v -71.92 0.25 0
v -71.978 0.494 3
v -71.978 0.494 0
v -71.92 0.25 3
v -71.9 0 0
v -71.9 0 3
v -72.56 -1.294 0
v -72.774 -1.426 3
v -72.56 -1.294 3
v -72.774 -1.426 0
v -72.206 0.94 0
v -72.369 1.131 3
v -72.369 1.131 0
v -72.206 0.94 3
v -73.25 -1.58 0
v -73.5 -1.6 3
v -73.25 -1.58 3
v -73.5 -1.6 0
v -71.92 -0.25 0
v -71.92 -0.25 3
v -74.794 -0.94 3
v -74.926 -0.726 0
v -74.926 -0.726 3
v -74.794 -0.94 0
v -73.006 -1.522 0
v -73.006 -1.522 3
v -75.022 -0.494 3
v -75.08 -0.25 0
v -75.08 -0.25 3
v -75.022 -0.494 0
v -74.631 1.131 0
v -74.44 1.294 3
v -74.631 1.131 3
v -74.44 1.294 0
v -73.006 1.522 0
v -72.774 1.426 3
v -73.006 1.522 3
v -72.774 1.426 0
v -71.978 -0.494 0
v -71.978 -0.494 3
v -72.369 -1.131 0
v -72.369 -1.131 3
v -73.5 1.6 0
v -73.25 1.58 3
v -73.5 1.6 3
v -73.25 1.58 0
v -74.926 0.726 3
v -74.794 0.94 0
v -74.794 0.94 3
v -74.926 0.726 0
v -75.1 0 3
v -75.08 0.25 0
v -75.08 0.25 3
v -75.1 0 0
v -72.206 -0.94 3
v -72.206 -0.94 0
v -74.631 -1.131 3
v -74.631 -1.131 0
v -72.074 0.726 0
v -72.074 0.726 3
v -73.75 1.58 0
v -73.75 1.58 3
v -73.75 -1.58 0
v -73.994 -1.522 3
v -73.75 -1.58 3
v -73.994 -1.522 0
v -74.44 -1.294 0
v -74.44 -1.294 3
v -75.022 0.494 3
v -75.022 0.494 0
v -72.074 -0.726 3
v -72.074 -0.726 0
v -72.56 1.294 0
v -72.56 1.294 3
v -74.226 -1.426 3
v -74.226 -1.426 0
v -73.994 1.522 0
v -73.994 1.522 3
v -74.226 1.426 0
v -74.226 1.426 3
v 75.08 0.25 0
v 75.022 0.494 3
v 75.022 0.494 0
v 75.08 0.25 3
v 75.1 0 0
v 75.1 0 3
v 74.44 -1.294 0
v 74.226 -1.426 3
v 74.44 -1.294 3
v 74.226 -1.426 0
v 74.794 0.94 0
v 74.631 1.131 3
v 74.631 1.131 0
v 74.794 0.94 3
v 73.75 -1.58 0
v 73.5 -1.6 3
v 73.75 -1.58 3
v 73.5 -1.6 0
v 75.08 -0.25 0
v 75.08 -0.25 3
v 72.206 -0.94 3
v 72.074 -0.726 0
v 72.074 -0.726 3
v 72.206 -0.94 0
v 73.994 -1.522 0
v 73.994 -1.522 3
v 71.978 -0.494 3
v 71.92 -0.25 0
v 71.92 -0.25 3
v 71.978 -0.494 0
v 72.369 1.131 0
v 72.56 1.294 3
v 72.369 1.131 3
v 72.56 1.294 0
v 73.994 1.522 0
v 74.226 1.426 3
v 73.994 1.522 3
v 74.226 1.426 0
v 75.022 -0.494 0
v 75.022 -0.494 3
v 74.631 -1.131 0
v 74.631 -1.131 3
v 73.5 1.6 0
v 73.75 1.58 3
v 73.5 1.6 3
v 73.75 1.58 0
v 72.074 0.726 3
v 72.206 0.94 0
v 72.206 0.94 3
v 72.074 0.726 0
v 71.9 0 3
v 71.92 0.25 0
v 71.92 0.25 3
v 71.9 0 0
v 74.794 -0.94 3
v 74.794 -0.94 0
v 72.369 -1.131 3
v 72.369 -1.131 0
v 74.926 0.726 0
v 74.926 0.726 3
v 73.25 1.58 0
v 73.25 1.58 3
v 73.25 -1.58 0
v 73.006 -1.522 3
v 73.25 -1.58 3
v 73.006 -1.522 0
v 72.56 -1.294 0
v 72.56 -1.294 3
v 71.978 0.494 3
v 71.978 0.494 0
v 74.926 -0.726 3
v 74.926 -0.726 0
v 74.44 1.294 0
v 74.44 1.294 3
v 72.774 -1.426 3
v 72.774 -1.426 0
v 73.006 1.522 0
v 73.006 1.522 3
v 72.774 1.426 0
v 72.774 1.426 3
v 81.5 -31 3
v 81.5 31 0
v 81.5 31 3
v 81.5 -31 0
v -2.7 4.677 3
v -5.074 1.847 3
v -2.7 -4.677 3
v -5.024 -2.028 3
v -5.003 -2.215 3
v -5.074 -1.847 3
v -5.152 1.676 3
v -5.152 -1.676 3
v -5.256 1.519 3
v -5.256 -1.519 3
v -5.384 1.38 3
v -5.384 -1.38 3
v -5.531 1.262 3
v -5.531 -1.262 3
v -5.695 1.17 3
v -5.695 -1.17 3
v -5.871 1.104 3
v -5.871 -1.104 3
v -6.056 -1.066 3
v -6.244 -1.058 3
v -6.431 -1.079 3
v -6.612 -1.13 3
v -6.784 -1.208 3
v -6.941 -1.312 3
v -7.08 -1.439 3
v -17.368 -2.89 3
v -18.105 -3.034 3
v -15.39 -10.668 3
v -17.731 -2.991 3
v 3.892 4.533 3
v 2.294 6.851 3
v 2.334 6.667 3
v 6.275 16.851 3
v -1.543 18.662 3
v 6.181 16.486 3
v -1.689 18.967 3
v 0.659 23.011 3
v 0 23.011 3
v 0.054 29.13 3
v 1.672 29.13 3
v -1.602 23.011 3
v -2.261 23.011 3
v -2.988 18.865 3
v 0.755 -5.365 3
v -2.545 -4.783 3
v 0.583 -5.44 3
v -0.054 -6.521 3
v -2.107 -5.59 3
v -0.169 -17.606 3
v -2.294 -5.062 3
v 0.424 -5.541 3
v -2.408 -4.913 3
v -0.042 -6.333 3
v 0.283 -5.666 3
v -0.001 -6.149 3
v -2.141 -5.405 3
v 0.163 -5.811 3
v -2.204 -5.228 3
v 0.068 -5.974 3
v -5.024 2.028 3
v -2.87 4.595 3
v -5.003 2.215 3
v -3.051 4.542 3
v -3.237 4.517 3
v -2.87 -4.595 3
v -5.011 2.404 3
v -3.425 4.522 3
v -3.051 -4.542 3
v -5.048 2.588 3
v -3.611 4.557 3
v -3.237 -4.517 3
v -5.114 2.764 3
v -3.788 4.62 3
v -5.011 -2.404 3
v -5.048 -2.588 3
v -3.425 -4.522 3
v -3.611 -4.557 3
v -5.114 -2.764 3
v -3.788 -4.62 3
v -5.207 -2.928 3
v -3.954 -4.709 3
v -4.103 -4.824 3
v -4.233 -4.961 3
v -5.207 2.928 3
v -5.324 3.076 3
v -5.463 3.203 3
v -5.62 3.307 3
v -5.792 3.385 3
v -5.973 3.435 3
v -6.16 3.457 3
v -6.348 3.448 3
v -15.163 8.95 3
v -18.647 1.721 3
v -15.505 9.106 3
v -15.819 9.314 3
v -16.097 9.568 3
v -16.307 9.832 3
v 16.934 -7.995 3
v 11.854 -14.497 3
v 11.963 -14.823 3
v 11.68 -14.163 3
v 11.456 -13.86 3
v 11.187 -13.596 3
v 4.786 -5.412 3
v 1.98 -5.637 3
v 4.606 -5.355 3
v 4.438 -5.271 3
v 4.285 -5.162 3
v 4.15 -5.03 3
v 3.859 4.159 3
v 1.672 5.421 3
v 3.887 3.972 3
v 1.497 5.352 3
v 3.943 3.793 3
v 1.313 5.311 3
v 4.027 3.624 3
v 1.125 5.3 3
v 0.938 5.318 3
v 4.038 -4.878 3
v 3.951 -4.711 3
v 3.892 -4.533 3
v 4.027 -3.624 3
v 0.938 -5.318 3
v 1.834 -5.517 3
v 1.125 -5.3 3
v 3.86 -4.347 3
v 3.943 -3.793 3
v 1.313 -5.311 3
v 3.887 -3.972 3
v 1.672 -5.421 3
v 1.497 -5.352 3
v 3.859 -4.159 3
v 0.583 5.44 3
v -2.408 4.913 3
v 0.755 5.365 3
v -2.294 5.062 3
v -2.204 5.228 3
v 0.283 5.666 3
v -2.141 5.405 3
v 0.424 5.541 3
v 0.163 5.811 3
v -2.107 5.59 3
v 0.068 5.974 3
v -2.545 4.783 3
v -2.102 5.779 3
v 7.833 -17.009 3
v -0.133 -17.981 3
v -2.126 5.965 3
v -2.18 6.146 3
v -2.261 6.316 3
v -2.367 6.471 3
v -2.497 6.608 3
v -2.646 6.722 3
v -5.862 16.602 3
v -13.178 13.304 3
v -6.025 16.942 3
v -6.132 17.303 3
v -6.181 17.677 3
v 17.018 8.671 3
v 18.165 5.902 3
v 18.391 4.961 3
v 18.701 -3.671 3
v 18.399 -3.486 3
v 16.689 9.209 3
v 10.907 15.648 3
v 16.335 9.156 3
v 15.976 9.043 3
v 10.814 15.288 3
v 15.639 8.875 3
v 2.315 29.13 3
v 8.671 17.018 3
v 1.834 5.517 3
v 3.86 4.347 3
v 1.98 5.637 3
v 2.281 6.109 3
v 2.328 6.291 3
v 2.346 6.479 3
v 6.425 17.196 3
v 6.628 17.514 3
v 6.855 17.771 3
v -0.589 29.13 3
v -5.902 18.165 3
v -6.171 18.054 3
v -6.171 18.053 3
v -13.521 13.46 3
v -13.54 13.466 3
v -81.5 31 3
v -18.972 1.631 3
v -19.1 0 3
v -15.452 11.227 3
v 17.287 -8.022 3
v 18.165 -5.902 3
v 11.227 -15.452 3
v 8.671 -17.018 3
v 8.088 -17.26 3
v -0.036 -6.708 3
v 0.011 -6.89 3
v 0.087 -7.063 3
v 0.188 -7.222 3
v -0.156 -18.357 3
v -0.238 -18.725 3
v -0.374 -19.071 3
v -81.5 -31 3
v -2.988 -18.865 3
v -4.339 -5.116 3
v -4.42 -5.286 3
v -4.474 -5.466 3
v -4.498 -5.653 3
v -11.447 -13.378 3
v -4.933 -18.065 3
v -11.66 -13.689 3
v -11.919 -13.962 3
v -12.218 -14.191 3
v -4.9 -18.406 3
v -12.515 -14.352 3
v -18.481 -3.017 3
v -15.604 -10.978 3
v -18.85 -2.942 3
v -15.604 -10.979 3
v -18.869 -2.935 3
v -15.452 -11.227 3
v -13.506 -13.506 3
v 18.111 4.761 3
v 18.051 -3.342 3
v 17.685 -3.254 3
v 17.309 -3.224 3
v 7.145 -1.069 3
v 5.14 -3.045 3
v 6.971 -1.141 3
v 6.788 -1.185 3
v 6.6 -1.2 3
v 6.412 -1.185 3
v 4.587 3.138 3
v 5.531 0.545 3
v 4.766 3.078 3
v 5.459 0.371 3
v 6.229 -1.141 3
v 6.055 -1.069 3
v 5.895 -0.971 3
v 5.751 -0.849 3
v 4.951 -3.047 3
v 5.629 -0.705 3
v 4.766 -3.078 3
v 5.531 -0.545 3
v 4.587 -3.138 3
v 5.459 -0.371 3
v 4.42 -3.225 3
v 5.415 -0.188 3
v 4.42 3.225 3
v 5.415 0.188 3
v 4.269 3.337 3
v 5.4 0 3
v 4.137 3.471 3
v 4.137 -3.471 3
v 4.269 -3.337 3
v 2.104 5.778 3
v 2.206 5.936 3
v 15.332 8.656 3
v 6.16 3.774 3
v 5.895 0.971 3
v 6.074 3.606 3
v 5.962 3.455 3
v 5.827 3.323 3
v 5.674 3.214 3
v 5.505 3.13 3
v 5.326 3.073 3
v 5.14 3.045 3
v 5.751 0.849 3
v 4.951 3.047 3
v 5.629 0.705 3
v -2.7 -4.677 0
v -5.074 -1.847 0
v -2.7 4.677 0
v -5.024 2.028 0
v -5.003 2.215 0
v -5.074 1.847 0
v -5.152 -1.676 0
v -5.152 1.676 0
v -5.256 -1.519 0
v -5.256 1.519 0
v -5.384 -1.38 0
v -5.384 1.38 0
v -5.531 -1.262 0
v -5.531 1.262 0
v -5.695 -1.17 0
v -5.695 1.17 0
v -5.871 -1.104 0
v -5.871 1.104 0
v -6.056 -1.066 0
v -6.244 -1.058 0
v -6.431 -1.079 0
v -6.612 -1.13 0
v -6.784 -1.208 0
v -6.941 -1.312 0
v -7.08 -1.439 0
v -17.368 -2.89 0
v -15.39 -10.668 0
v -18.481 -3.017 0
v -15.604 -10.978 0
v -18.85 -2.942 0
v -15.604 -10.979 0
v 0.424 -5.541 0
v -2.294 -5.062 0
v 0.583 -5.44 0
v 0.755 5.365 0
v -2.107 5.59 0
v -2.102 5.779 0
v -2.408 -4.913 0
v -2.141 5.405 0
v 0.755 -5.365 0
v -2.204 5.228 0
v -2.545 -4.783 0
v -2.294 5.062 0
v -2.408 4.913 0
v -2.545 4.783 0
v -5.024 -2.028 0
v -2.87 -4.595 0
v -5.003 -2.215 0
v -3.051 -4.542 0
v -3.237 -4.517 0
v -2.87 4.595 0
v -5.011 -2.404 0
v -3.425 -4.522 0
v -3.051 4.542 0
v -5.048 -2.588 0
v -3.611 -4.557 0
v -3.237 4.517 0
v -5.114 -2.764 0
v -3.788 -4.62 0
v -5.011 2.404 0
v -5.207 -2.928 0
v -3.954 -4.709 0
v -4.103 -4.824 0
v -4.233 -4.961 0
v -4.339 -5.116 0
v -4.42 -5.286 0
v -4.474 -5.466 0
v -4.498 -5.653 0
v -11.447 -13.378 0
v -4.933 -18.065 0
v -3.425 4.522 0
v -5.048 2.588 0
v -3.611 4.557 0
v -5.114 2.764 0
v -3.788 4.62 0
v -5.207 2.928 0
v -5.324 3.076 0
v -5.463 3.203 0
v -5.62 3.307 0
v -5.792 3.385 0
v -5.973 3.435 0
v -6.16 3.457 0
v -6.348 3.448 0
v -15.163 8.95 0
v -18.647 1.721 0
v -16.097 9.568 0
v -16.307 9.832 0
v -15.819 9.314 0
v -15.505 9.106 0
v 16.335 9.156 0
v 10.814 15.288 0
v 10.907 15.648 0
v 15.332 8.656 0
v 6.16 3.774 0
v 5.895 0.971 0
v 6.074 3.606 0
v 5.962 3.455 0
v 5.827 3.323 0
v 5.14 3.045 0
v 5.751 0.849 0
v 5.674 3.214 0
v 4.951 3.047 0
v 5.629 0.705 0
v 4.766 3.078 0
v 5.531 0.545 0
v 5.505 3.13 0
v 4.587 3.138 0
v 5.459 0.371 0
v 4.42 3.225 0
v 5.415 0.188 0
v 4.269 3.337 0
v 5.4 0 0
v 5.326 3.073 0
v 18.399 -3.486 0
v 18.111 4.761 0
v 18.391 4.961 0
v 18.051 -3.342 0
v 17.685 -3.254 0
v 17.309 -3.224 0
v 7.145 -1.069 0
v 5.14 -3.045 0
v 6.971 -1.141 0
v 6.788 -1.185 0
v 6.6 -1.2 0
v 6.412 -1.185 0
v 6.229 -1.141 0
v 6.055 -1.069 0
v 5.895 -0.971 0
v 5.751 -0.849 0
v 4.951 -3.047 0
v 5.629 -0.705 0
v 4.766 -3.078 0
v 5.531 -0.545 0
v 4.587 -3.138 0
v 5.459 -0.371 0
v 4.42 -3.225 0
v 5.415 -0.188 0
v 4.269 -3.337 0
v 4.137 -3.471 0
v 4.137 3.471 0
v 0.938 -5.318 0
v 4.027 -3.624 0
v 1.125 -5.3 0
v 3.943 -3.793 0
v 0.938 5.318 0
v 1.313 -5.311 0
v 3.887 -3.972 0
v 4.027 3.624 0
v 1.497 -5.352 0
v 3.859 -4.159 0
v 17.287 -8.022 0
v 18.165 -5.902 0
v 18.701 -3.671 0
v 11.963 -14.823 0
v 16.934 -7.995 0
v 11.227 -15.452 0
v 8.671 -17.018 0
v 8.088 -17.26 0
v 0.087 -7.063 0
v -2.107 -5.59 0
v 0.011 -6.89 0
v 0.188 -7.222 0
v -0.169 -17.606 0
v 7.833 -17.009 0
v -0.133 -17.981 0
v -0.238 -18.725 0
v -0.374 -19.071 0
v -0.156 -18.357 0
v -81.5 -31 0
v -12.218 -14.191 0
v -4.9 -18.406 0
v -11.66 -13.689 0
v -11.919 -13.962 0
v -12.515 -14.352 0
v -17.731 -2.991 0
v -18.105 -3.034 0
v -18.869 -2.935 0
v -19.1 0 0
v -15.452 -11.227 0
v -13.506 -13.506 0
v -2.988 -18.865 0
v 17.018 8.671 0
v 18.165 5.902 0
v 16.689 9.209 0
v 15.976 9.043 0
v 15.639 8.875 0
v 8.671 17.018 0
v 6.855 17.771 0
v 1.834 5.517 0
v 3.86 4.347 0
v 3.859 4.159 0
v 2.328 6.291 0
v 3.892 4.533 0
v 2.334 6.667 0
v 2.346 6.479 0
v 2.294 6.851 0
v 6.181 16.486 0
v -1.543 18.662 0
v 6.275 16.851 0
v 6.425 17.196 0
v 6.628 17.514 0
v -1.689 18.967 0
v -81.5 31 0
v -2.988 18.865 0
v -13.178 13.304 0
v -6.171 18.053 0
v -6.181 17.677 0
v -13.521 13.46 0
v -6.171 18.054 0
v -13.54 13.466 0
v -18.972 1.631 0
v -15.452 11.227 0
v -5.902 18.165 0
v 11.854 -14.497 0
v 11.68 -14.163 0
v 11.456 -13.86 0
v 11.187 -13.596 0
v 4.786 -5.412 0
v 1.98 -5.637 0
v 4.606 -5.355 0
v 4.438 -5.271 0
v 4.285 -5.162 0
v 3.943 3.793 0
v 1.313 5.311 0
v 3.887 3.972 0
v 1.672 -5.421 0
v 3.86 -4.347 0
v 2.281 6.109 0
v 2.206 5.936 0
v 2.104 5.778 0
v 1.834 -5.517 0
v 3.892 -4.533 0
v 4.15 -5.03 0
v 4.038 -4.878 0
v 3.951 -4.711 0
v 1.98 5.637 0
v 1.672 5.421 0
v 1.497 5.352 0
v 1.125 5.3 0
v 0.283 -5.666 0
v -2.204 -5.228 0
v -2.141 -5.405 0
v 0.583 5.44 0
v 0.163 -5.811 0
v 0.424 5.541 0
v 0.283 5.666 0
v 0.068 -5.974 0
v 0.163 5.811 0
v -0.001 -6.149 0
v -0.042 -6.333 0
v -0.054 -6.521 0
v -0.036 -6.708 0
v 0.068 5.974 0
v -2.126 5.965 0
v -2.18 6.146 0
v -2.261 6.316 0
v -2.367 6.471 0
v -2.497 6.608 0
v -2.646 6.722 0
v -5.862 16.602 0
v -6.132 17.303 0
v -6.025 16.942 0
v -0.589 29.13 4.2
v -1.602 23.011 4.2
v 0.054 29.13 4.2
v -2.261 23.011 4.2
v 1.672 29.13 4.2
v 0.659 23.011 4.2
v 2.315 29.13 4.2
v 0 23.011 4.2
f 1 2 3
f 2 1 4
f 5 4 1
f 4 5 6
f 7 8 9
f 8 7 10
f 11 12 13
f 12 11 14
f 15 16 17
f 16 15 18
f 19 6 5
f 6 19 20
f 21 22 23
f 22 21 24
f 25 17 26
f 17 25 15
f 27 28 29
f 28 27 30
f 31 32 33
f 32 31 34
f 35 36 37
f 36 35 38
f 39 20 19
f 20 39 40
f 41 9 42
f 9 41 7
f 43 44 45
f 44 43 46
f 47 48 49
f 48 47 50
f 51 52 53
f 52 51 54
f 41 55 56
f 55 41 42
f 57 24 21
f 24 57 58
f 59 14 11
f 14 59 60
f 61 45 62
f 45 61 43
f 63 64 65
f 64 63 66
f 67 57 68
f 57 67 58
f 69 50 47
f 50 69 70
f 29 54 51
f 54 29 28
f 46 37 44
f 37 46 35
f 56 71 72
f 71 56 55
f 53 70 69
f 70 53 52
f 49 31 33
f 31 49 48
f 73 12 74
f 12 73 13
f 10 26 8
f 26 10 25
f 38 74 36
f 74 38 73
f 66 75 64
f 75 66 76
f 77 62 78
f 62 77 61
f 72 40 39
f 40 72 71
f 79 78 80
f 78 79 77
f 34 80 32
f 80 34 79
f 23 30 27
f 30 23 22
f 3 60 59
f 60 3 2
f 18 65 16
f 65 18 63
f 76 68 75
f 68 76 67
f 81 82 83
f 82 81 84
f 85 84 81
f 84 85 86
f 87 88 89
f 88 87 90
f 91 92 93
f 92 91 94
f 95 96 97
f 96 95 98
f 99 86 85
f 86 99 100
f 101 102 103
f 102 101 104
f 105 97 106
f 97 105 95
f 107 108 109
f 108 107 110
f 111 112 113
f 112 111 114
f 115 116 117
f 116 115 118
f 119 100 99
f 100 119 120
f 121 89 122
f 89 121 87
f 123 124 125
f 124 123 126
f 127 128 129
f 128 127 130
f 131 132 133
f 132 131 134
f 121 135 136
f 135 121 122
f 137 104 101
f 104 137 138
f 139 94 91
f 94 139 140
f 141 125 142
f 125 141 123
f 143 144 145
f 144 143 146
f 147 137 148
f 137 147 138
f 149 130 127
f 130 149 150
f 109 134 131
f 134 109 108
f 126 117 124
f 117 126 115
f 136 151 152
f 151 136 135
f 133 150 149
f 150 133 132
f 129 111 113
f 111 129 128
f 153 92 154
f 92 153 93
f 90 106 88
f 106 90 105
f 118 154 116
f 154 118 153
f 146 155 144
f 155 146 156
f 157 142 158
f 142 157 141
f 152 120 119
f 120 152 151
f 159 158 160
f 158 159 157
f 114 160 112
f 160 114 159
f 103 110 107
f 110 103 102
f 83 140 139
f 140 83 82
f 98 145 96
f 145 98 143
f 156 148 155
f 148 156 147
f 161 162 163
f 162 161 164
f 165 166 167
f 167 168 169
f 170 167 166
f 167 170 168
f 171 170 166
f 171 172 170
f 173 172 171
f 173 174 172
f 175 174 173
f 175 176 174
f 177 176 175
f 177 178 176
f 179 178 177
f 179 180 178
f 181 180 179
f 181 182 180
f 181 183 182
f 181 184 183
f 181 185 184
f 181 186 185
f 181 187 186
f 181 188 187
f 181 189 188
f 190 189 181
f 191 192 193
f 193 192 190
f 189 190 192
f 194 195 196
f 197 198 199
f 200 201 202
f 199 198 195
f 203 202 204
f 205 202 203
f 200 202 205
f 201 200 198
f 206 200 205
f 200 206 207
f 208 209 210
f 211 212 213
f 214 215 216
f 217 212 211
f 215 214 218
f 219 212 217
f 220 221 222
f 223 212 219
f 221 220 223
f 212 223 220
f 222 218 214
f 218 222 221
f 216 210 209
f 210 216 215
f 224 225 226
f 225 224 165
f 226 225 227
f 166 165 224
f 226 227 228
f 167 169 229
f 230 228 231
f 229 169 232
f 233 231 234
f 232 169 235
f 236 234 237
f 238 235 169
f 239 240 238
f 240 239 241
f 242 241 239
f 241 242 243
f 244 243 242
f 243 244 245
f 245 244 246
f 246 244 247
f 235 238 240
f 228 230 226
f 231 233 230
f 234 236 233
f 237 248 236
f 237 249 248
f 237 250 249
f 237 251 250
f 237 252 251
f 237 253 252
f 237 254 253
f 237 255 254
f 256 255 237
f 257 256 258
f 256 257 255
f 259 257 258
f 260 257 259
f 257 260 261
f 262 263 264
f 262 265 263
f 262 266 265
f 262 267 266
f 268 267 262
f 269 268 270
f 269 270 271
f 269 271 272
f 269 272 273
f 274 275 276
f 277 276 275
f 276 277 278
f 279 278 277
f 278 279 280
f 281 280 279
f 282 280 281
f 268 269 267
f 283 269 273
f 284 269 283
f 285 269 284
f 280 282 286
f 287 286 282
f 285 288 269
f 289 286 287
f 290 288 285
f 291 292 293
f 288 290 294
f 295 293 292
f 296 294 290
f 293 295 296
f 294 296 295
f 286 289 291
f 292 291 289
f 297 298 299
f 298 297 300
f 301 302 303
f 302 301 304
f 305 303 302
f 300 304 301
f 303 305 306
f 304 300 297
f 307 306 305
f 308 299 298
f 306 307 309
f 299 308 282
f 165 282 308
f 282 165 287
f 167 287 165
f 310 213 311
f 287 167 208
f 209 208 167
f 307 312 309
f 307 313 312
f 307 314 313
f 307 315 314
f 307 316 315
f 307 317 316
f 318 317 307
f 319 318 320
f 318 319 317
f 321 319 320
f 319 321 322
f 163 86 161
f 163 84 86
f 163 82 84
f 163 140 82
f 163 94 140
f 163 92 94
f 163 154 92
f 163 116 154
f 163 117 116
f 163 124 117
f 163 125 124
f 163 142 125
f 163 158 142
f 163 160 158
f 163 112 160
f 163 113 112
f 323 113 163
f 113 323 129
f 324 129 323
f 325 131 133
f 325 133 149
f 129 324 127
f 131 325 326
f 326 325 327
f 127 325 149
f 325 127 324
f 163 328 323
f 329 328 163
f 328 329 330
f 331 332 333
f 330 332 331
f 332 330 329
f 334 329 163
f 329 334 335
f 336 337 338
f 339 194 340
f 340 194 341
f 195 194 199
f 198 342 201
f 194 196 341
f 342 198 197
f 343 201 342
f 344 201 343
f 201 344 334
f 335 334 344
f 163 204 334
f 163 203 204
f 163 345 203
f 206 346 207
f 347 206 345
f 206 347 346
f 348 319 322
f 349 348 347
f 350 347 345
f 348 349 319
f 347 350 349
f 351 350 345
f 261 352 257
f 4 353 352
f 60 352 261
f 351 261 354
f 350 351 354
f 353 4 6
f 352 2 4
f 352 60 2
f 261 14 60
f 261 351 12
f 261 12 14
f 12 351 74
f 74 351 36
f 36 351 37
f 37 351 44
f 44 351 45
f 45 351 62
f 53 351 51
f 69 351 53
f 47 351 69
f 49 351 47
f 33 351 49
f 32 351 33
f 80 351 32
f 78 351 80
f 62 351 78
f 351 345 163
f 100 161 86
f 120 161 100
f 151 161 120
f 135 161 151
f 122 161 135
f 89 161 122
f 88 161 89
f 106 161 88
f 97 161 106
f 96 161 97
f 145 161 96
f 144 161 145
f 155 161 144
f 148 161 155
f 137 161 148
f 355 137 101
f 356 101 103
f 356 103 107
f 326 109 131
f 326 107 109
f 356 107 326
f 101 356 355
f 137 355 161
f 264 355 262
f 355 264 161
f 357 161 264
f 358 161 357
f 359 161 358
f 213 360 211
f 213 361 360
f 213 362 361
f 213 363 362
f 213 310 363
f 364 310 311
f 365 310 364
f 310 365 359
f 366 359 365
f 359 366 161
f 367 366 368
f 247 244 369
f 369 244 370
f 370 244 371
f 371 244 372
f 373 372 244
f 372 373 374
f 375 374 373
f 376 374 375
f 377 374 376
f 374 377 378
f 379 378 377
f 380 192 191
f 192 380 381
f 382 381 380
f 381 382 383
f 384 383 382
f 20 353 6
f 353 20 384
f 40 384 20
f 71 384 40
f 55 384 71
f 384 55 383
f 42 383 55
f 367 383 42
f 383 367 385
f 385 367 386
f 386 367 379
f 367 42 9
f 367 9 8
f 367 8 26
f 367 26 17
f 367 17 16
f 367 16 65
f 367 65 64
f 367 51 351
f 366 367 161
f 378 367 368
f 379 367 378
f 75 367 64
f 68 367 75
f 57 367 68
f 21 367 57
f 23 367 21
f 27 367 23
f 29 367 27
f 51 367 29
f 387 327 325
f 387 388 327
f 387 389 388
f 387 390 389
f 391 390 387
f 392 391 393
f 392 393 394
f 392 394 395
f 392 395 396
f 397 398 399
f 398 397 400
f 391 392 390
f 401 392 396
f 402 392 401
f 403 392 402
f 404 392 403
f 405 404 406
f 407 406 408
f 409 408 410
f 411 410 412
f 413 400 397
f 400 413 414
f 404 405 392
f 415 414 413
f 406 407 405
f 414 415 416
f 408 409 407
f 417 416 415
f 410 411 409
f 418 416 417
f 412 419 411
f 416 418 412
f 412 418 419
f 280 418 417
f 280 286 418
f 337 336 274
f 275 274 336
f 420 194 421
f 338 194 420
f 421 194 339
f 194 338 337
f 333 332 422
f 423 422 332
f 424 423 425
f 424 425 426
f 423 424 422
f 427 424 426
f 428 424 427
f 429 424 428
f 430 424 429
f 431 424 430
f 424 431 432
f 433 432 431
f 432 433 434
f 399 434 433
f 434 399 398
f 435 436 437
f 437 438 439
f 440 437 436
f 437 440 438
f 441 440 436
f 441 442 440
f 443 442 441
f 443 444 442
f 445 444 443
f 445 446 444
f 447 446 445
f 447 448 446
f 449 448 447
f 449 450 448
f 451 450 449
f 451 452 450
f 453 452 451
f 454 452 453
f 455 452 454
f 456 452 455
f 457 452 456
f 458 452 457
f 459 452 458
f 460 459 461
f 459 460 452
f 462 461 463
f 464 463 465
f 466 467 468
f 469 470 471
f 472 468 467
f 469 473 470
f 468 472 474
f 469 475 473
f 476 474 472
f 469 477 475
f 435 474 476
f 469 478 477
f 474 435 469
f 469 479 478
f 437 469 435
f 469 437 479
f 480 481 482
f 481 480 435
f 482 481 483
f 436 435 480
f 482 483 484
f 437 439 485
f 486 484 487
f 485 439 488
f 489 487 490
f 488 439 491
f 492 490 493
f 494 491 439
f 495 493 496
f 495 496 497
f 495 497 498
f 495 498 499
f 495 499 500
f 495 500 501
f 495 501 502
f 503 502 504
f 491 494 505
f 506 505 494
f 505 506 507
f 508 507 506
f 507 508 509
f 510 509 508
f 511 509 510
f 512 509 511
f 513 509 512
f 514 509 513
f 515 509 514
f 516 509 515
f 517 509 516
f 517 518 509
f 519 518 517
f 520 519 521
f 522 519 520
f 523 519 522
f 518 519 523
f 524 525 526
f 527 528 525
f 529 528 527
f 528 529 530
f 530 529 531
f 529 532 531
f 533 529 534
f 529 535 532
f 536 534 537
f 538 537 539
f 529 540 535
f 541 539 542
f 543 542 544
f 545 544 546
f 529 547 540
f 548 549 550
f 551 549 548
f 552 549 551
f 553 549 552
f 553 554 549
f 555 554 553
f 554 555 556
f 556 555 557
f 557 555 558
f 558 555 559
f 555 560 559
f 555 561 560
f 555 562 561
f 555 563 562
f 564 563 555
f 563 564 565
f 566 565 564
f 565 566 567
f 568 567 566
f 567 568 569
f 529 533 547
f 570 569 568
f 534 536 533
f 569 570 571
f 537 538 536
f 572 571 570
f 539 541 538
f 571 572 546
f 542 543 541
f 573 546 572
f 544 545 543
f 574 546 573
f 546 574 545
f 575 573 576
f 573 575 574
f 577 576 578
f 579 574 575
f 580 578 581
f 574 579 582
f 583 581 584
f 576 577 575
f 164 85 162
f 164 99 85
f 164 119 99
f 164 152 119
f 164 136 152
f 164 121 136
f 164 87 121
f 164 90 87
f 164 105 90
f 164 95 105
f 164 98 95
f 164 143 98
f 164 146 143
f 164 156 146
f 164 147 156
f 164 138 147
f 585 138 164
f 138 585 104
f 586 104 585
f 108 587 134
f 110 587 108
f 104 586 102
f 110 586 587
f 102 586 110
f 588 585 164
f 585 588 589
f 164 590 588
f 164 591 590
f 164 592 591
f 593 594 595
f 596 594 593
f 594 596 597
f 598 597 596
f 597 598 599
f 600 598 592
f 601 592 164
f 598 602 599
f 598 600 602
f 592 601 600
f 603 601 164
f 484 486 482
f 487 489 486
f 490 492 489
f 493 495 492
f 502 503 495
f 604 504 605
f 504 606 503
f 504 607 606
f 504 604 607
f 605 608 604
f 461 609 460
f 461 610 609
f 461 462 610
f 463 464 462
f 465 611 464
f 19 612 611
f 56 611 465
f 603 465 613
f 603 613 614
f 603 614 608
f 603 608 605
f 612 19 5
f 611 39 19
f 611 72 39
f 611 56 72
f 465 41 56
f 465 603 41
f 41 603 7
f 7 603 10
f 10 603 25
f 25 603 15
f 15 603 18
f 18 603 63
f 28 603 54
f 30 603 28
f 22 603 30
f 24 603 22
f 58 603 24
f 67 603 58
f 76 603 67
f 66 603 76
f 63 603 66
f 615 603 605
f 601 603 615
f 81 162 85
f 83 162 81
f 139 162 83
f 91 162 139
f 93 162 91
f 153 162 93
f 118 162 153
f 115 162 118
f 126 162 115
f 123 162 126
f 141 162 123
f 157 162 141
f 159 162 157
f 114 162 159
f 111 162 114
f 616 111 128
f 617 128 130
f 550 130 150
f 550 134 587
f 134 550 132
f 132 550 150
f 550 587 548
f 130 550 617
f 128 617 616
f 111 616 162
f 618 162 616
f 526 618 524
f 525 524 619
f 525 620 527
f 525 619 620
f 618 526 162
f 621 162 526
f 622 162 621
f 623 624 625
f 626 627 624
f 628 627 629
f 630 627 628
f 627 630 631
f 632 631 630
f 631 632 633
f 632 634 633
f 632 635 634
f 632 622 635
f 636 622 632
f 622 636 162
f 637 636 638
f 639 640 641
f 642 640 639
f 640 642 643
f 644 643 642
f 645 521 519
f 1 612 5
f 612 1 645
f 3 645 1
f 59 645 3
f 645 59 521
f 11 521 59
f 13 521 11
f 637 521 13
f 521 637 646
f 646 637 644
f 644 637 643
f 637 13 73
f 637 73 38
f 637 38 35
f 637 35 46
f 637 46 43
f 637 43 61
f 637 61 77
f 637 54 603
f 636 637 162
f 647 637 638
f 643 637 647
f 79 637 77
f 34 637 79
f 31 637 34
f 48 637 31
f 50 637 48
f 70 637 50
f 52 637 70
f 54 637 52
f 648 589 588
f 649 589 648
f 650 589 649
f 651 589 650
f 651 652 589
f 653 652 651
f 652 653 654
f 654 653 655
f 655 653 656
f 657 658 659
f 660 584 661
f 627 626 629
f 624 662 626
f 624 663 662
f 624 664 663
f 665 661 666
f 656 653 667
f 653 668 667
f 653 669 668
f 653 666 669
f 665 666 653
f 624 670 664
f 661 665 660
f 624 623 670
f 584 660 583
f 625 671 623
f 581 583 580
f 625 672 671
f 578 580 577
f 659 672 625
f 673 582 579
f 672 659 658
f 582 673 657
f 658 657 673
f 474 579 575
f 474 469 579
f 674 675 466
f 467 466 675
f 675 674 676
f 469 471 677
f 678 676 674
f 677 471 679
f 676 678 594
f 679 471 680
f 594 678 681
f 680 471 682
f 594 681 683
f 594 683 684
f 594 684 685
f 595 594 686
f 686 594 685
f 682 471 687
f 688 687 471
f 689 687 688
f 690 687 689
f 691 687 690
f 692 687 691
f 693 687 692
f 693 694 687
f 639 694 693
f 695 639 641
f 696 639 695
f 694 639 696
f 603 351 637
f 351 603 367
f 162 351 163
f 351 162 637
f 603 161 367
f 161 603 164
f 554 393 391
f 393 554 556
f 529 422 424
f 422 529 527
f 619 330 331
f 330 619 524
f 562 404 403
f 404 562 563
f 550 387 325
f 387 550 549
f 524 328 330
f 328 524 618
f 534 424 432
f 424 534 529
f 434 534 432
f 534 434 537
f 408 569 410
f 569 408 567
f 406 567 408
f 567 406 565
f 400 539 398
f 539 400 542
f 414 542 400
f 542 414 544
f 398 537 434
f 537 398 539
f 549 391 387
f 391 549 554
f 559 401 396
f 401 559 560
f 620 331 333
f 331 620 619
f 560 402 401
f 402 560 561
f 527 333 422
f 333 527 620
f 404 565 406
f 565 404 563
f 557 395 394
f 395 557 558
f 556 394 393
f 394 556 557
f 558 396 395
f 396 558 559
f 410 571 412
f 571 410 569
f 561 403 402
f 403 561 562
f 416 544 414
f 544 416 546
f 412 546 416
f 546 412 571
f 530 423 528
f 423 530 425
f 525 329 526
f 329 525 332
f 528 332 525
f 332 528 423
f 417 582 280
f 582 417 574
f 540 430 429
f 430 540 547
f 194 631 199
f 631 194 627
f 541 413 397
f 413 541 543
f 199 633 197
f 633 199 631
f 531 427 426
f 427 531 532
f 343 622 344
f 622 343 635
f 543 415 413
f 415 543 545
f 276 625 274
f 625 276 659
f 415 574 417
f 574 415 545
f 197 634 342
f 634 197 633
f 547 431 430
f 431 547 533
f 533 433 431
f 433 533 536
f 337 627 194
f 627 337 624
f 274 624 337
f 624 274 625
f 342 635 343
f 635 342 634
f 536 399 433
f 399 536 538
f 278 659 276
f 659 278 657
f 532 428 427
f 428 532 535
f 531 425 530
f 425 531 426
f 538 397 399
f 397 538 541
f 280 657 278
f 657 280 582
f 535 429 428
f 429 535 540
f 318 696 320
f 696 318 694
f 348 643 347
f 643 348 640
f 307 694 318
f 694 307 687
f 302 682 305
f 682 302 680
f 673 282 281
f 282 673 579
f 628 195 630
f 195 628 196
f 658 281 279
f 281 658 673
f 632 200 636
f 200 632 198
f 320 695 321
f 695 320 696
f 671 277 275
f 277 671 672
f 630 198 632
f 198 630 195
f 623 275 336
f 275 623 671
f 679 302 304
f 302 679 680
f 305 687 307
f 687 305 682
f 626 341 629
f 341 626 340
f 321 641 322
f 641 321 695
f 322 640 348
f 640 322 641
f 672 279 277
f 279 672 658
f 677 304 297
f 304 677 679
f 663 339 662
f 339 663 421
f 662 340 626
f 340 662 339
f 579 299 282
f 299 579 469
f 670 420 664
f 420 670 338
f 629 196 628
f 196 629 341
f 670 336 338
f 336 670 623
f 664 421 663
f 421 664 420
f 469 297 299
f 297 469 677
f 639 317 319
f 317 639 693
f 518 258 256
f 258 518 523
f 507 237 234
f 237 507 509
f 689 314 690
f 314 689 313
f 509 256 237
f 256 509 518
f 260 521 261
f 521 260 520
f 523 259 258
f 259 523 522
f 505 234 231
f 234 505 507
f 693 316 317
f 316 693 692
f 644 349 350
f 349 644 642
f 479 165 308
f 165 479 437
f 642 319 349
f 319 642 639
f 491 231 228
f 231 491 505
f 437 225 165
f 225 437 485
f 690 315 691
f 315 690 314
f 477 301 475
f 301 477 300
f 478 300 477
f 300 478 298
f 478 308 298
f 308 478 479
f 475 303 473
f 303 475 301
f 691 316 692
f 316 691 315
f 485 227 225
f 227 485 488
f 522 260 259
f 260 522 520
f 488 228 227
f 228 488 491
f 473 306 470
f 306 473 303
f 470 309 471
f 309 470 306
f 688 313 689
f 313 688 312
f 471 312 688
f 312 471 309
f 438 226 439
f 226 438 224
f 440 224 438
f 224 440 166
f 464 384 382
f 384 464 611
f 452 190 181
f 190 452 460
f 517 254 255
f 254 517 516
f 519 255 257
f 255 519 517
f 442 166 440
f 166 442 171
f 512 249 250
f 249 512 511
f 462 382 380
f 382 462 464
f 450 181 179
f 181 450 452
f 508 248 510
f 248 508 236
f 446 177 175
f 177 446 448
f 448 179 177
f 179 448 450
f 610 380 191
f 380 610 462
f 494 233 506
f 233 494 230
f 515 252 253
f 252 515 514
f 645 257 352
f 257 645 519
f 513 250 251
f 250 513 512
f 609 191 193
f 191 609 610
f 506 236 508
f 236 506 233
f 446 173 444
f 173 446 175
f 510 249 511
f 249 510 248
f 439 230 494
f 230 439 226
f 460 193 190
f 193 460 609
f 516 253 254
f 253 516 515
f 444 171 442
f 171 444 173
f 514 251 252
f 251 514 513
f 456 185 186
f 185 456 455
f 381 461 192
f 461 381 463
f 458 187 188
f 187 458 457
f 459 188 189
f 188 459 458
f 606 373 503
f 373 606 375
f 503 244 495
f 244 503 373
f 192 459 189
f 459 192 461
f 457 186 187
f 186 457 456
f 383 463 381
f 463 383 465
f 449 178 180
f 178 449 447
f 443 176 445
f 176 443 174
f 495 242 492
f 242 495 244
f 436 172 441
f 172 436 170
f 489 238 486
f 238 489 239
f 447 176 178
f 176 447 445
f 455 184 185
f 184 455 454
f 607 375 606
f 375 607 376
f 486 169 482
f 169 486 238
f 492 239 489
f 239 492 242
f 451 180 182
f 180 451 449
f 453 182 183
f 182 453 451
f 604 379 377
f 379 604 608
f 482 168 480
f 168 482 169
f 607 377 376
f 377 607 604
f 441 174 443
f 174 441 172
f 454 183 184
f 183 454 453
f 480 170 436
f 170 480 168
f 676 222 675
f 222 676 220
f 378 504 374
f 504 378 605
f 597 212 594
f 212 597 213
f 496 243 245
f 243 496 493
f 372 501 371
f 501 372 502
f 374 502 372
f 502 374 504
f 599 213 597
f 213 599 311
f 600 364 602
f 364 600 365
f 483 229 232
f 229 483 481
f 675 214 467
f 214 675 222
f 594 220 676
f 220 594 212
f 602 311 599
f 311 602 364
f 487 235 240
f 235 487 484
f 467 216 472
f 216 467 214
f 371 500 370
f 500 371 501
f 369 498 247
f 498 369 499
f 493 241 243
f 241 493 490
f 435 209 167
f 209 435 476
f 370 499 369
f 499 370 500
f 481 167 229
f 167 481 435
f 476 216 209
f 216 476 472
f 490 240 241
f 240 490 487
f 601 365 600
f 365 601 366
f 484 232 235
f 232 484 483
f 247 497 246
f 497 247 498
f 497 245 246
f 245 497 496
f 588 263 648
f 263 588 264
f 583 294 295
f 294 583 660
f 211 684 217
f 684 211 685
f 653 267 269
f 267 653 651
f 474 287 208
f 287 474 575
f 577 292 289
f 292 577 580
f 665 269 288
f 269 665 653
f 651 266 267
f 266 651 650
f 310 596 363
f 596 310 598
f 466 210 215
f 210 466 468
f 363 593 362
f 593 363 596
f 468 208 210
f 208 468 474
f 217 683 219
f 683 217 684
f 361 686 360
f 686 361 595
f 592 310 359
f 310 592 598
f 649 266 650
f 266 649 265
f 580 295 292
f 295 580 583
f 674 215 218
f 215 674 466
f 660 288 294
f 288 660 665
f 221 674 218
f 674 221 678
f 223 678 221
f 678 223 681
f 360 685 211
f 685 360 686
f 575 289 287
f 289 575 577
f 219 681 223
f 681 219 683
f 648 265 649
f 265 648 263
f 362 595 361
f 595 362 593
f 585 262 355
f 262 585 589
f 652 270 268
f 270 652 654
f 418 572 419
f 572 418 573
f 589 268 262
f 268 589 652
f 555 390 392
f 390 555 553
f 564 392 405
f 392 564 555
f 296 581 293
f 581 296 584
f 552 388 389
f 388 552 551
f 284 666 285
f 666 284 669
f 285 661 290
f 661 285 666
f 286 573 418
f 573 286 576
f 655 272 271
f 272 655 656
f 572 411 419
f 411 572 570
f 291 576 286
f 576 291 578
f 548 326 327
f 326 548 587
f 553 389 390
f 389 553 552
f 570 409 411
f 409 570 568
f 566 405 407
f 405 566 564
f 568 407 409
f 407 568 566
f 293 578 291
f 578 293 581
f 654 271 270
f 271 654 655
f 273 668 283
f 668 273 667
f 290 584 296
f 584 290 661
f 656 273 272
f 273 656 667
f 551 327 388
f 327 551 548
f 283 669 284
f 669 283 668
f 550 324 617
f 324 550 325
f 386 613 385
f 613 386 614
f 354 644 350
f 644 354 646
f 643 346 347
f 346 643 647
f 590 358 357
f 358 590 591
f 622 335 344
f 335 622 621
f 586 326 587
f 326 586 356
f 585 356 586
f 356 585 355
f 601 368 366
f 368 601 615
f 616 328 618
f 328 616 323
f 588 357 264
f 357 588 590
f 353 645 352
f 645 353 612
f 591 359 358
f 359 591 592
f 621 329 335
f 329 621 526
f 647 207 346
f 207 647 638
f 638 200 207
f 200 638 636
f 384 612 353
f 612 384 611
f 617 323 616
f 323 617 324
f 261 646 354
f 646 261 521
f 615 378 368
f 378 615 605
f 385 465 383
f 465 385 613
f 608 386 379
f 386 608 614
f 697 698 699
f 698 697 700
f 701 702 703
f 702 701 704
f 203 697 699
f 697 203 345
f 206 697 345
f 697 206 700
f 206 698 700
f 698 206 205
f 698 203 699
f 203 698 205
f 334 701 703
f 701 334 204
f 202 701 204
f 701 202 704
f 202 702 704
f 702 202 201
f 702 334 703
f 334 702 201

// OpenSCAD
// file: core.scad
// ============================================================
//  NEXUS9 / OpenClaw — Mac Mini M4 Modular Stacking Rack
//  core.scad — shared parameters + reusable modules
//  Units: mm | Printer: Bambu X1C (256^3) | Support-free, flat base
//  Generated 2026-06-06
// ============================================================

// ----- Mac Mini M4 -----
mac_w = 127;
mac_d = 127;
mac_h = 50;
clearance = 3;            // air gap around each unit

// ----- Bay internal -----
inner_w = 135;            // internal width
inner_d = 140;            // internal depth
bay_h   = 62;             // per-module clear column height (mac_h + airflow)

// ----- Structure -----
wall     = 3;
floor_t  = 5;             // floor / shelf plate thickness (>= spigot recess + feat_min)
col      = 14;            // corner column cross-section (square)
feat_min = 1.5;

// derived footprint (4 corner columns around the inner volume)
out_w = inner_w + 2*col;     // 163
out_d = inner_d + 2*col;     // 168

// column corner centers — inset 1 mm from the floor edge so column outer faces
// are NOT coplanar with the floor edges (coincident faces stop CGAL from fusing
// the union into a single watertight body).
edge = 1.0;
cx = out_w/2 - col/2 - edge;
cy = out_d/2 - col/2 - edge;
corners = [[ cx, cy], [ cx,-cy], [-cx, cy], [-cx,-cy]];

// ----- M3 hardware -----
m3_clear  = 3.2;          // clearance hole
heatset_d = 4.6;          // heat-set insert pocket
heatset_h = 5;
m3_head   = 6.0;

// ----- Alignment pins -----
pin_d    = 5;
pin_len  = 8;
pin_fit  = 0.25;          // socket clearance
socket_d = pin_d + pin_fit;
socket_h = pin_len + 0.6;
pin_off  = 4;             // pin offset from column center (toward inner corner)

// ----- Stacking spigot (column top -> floor recess), shared by all parts -----
spigot   = col - 5;       // 9 mm square locating spigot
spigot_h = 3;
recess   = spigot + 2*pin_fit;

// ----- Airflow -----
vent_hole = 8;
vent_gap  = 4;            // wall between holes -> ~64% open area

// ----- Front panel interface (shared by EVERY panel variant) -----
panel_t        = 3;
panel_w        = out_w;        // 163 — covers the bay front
panel_h        = bay_h;        // 62
panel_border   = 9;            // solid frame (holds screws + strength)
panel_win_w    = panel_w - 2*panel_border;   // 145 — decorative window width
panel_win_h    = panel_h - 2*panel_border;   // 44  — decorative window height
panel_mount_dx = cx;           // screw holes align with bay front heat-sets (+-cx, mid)

$fn = 40;

// ---------- reusable modules ----------
module m3_clearance_hole(depth = 40) { cylinder(h = depth, d = m3_clear); }

module heatset_pocket() { cylinder(h = heatset_h + 0.2, d = heatset_d); }

module align_pin() { cylinder(h = pin_len, d = pin_d); }

module align_socket() { cylinder(h = socket_h, d = socket_d); }

// airflow grid filling an area w x d (centered), holes through thickness t
module airflow_grid(w, d, t) {
    step = vent_hole + vent_gap;
    nx = max(1, floor((w + vent_gap) / step));
    ny = max(1, floor((d + vent_gap) / step));
    ox = -(nx - 1) * step / 2;
    oy = -(ny - 1) * step / 2;
    for (i = [0 : nx - 1])
        for (j = [0 : ny - 1])
            translate([ox + i*step, oy + j*step, -0.1])
                cylinder(h = t + 0.2, d = vent_hole);
}

// Standard front-panel blank: plate + 2 side screw holes + 2 alignment pins.
// Every decorative panel variant starts from this so they are interchangeable.
// Panel lies in the XY plane, thickness along +Z. Decorative pattern is cut/added
// by the variant on top of this.
// Framed plate + 2 mount screw holes (align with the bay front heat-sets at
// +-cx, mid-height). Decorative pattern goes in the central window
// (panel_win_w x panel_win_h). Printed flat: plate in XY, thickness along +Z.
// Every variant starts from this so all panels are interchangeable.
module panel_blank() {
    difference() {
        translate([-panel_w/2, -panel_h/2, 0]) cube([panel_w, panel_h, panel_t]);
        for (sx = [-panel_mount_dx, panel_mount_dx])
            translate([sx, 0, -0.1]) cylinder(h = panel_t + 0.2, d = m3_clear);
    }
}

// Raised (embossed) text helper — 1.2 mm proud of the front face, per spec.
module emboss(txt, size = 7, y = 0) {
    translate([0, y, panel_t])
        linear_extrude(1.2)
            text(txt, size = size, halign = "center", valign = "center");
}
// main file
include <core.scad>

// ---- VENTILATION TURBINE ----
// Central solid hub + N curved tapered blades cut THROUGH the plate for airflow,
// inside a bounding circle. A thin solid outer rim is kept by the bounding circle
// staying inside the window.

N        = 9;                         // number of blades
bound_r  = panel_win_h/2 - 2;         // 20 mm bounding circle (fits inside window)
hub_r    = 5;                         // central solid hub radius
rim      = 1.8;                       // approx solid wall between blade tips and bound

// one tapered curved blade slot: hull of a small inner cylinder and a larger
// outer cylinder, offset radially -> a teardrop airflow slot. Rotated about Z to
// sweep, giving a swept (curved) impression across the N blades.
module blade_slot(t) {
    r_in  = hub_r + 1.6;              // start just outside hub
    r_out = bound_r - rim;           // stop before the outer rim
    // inner (narrow) end
    translate([0,0,-0.1])
        hull() {
            translate([r_in,  0, 0]) cylinder(h = t + 0.2, r = 1.2);
            // sweep the outer (wide) end angularly to make the slot look curved
            rotate([0,0,22]) translate([r_out, 0, 0]) cylinder(h = t + 0.2, r = 2.4);
        }
}

module turbine_cut(t) {
    intersection() {
        // keep all cuts inside the bounding circle
        translate([0,0,-0.2]) cylinder(h = t + 0.4, r = bound_r - rim/2);
        union() {
            for (k = [0 : N - 1])
                rotate([0, 0, k * 360 / N]) blade_slot(t);
        }
    }
}

module turbine() {
    union() {
        difference() {
            panel_blank();
            turbine_cut(panel_t);
        }
        // tiny raised mark at top of window, on solid plate (no cut beneath)
        emboss("//", 6, panel_win_h/2 + 4);
    }
}

turbine();
